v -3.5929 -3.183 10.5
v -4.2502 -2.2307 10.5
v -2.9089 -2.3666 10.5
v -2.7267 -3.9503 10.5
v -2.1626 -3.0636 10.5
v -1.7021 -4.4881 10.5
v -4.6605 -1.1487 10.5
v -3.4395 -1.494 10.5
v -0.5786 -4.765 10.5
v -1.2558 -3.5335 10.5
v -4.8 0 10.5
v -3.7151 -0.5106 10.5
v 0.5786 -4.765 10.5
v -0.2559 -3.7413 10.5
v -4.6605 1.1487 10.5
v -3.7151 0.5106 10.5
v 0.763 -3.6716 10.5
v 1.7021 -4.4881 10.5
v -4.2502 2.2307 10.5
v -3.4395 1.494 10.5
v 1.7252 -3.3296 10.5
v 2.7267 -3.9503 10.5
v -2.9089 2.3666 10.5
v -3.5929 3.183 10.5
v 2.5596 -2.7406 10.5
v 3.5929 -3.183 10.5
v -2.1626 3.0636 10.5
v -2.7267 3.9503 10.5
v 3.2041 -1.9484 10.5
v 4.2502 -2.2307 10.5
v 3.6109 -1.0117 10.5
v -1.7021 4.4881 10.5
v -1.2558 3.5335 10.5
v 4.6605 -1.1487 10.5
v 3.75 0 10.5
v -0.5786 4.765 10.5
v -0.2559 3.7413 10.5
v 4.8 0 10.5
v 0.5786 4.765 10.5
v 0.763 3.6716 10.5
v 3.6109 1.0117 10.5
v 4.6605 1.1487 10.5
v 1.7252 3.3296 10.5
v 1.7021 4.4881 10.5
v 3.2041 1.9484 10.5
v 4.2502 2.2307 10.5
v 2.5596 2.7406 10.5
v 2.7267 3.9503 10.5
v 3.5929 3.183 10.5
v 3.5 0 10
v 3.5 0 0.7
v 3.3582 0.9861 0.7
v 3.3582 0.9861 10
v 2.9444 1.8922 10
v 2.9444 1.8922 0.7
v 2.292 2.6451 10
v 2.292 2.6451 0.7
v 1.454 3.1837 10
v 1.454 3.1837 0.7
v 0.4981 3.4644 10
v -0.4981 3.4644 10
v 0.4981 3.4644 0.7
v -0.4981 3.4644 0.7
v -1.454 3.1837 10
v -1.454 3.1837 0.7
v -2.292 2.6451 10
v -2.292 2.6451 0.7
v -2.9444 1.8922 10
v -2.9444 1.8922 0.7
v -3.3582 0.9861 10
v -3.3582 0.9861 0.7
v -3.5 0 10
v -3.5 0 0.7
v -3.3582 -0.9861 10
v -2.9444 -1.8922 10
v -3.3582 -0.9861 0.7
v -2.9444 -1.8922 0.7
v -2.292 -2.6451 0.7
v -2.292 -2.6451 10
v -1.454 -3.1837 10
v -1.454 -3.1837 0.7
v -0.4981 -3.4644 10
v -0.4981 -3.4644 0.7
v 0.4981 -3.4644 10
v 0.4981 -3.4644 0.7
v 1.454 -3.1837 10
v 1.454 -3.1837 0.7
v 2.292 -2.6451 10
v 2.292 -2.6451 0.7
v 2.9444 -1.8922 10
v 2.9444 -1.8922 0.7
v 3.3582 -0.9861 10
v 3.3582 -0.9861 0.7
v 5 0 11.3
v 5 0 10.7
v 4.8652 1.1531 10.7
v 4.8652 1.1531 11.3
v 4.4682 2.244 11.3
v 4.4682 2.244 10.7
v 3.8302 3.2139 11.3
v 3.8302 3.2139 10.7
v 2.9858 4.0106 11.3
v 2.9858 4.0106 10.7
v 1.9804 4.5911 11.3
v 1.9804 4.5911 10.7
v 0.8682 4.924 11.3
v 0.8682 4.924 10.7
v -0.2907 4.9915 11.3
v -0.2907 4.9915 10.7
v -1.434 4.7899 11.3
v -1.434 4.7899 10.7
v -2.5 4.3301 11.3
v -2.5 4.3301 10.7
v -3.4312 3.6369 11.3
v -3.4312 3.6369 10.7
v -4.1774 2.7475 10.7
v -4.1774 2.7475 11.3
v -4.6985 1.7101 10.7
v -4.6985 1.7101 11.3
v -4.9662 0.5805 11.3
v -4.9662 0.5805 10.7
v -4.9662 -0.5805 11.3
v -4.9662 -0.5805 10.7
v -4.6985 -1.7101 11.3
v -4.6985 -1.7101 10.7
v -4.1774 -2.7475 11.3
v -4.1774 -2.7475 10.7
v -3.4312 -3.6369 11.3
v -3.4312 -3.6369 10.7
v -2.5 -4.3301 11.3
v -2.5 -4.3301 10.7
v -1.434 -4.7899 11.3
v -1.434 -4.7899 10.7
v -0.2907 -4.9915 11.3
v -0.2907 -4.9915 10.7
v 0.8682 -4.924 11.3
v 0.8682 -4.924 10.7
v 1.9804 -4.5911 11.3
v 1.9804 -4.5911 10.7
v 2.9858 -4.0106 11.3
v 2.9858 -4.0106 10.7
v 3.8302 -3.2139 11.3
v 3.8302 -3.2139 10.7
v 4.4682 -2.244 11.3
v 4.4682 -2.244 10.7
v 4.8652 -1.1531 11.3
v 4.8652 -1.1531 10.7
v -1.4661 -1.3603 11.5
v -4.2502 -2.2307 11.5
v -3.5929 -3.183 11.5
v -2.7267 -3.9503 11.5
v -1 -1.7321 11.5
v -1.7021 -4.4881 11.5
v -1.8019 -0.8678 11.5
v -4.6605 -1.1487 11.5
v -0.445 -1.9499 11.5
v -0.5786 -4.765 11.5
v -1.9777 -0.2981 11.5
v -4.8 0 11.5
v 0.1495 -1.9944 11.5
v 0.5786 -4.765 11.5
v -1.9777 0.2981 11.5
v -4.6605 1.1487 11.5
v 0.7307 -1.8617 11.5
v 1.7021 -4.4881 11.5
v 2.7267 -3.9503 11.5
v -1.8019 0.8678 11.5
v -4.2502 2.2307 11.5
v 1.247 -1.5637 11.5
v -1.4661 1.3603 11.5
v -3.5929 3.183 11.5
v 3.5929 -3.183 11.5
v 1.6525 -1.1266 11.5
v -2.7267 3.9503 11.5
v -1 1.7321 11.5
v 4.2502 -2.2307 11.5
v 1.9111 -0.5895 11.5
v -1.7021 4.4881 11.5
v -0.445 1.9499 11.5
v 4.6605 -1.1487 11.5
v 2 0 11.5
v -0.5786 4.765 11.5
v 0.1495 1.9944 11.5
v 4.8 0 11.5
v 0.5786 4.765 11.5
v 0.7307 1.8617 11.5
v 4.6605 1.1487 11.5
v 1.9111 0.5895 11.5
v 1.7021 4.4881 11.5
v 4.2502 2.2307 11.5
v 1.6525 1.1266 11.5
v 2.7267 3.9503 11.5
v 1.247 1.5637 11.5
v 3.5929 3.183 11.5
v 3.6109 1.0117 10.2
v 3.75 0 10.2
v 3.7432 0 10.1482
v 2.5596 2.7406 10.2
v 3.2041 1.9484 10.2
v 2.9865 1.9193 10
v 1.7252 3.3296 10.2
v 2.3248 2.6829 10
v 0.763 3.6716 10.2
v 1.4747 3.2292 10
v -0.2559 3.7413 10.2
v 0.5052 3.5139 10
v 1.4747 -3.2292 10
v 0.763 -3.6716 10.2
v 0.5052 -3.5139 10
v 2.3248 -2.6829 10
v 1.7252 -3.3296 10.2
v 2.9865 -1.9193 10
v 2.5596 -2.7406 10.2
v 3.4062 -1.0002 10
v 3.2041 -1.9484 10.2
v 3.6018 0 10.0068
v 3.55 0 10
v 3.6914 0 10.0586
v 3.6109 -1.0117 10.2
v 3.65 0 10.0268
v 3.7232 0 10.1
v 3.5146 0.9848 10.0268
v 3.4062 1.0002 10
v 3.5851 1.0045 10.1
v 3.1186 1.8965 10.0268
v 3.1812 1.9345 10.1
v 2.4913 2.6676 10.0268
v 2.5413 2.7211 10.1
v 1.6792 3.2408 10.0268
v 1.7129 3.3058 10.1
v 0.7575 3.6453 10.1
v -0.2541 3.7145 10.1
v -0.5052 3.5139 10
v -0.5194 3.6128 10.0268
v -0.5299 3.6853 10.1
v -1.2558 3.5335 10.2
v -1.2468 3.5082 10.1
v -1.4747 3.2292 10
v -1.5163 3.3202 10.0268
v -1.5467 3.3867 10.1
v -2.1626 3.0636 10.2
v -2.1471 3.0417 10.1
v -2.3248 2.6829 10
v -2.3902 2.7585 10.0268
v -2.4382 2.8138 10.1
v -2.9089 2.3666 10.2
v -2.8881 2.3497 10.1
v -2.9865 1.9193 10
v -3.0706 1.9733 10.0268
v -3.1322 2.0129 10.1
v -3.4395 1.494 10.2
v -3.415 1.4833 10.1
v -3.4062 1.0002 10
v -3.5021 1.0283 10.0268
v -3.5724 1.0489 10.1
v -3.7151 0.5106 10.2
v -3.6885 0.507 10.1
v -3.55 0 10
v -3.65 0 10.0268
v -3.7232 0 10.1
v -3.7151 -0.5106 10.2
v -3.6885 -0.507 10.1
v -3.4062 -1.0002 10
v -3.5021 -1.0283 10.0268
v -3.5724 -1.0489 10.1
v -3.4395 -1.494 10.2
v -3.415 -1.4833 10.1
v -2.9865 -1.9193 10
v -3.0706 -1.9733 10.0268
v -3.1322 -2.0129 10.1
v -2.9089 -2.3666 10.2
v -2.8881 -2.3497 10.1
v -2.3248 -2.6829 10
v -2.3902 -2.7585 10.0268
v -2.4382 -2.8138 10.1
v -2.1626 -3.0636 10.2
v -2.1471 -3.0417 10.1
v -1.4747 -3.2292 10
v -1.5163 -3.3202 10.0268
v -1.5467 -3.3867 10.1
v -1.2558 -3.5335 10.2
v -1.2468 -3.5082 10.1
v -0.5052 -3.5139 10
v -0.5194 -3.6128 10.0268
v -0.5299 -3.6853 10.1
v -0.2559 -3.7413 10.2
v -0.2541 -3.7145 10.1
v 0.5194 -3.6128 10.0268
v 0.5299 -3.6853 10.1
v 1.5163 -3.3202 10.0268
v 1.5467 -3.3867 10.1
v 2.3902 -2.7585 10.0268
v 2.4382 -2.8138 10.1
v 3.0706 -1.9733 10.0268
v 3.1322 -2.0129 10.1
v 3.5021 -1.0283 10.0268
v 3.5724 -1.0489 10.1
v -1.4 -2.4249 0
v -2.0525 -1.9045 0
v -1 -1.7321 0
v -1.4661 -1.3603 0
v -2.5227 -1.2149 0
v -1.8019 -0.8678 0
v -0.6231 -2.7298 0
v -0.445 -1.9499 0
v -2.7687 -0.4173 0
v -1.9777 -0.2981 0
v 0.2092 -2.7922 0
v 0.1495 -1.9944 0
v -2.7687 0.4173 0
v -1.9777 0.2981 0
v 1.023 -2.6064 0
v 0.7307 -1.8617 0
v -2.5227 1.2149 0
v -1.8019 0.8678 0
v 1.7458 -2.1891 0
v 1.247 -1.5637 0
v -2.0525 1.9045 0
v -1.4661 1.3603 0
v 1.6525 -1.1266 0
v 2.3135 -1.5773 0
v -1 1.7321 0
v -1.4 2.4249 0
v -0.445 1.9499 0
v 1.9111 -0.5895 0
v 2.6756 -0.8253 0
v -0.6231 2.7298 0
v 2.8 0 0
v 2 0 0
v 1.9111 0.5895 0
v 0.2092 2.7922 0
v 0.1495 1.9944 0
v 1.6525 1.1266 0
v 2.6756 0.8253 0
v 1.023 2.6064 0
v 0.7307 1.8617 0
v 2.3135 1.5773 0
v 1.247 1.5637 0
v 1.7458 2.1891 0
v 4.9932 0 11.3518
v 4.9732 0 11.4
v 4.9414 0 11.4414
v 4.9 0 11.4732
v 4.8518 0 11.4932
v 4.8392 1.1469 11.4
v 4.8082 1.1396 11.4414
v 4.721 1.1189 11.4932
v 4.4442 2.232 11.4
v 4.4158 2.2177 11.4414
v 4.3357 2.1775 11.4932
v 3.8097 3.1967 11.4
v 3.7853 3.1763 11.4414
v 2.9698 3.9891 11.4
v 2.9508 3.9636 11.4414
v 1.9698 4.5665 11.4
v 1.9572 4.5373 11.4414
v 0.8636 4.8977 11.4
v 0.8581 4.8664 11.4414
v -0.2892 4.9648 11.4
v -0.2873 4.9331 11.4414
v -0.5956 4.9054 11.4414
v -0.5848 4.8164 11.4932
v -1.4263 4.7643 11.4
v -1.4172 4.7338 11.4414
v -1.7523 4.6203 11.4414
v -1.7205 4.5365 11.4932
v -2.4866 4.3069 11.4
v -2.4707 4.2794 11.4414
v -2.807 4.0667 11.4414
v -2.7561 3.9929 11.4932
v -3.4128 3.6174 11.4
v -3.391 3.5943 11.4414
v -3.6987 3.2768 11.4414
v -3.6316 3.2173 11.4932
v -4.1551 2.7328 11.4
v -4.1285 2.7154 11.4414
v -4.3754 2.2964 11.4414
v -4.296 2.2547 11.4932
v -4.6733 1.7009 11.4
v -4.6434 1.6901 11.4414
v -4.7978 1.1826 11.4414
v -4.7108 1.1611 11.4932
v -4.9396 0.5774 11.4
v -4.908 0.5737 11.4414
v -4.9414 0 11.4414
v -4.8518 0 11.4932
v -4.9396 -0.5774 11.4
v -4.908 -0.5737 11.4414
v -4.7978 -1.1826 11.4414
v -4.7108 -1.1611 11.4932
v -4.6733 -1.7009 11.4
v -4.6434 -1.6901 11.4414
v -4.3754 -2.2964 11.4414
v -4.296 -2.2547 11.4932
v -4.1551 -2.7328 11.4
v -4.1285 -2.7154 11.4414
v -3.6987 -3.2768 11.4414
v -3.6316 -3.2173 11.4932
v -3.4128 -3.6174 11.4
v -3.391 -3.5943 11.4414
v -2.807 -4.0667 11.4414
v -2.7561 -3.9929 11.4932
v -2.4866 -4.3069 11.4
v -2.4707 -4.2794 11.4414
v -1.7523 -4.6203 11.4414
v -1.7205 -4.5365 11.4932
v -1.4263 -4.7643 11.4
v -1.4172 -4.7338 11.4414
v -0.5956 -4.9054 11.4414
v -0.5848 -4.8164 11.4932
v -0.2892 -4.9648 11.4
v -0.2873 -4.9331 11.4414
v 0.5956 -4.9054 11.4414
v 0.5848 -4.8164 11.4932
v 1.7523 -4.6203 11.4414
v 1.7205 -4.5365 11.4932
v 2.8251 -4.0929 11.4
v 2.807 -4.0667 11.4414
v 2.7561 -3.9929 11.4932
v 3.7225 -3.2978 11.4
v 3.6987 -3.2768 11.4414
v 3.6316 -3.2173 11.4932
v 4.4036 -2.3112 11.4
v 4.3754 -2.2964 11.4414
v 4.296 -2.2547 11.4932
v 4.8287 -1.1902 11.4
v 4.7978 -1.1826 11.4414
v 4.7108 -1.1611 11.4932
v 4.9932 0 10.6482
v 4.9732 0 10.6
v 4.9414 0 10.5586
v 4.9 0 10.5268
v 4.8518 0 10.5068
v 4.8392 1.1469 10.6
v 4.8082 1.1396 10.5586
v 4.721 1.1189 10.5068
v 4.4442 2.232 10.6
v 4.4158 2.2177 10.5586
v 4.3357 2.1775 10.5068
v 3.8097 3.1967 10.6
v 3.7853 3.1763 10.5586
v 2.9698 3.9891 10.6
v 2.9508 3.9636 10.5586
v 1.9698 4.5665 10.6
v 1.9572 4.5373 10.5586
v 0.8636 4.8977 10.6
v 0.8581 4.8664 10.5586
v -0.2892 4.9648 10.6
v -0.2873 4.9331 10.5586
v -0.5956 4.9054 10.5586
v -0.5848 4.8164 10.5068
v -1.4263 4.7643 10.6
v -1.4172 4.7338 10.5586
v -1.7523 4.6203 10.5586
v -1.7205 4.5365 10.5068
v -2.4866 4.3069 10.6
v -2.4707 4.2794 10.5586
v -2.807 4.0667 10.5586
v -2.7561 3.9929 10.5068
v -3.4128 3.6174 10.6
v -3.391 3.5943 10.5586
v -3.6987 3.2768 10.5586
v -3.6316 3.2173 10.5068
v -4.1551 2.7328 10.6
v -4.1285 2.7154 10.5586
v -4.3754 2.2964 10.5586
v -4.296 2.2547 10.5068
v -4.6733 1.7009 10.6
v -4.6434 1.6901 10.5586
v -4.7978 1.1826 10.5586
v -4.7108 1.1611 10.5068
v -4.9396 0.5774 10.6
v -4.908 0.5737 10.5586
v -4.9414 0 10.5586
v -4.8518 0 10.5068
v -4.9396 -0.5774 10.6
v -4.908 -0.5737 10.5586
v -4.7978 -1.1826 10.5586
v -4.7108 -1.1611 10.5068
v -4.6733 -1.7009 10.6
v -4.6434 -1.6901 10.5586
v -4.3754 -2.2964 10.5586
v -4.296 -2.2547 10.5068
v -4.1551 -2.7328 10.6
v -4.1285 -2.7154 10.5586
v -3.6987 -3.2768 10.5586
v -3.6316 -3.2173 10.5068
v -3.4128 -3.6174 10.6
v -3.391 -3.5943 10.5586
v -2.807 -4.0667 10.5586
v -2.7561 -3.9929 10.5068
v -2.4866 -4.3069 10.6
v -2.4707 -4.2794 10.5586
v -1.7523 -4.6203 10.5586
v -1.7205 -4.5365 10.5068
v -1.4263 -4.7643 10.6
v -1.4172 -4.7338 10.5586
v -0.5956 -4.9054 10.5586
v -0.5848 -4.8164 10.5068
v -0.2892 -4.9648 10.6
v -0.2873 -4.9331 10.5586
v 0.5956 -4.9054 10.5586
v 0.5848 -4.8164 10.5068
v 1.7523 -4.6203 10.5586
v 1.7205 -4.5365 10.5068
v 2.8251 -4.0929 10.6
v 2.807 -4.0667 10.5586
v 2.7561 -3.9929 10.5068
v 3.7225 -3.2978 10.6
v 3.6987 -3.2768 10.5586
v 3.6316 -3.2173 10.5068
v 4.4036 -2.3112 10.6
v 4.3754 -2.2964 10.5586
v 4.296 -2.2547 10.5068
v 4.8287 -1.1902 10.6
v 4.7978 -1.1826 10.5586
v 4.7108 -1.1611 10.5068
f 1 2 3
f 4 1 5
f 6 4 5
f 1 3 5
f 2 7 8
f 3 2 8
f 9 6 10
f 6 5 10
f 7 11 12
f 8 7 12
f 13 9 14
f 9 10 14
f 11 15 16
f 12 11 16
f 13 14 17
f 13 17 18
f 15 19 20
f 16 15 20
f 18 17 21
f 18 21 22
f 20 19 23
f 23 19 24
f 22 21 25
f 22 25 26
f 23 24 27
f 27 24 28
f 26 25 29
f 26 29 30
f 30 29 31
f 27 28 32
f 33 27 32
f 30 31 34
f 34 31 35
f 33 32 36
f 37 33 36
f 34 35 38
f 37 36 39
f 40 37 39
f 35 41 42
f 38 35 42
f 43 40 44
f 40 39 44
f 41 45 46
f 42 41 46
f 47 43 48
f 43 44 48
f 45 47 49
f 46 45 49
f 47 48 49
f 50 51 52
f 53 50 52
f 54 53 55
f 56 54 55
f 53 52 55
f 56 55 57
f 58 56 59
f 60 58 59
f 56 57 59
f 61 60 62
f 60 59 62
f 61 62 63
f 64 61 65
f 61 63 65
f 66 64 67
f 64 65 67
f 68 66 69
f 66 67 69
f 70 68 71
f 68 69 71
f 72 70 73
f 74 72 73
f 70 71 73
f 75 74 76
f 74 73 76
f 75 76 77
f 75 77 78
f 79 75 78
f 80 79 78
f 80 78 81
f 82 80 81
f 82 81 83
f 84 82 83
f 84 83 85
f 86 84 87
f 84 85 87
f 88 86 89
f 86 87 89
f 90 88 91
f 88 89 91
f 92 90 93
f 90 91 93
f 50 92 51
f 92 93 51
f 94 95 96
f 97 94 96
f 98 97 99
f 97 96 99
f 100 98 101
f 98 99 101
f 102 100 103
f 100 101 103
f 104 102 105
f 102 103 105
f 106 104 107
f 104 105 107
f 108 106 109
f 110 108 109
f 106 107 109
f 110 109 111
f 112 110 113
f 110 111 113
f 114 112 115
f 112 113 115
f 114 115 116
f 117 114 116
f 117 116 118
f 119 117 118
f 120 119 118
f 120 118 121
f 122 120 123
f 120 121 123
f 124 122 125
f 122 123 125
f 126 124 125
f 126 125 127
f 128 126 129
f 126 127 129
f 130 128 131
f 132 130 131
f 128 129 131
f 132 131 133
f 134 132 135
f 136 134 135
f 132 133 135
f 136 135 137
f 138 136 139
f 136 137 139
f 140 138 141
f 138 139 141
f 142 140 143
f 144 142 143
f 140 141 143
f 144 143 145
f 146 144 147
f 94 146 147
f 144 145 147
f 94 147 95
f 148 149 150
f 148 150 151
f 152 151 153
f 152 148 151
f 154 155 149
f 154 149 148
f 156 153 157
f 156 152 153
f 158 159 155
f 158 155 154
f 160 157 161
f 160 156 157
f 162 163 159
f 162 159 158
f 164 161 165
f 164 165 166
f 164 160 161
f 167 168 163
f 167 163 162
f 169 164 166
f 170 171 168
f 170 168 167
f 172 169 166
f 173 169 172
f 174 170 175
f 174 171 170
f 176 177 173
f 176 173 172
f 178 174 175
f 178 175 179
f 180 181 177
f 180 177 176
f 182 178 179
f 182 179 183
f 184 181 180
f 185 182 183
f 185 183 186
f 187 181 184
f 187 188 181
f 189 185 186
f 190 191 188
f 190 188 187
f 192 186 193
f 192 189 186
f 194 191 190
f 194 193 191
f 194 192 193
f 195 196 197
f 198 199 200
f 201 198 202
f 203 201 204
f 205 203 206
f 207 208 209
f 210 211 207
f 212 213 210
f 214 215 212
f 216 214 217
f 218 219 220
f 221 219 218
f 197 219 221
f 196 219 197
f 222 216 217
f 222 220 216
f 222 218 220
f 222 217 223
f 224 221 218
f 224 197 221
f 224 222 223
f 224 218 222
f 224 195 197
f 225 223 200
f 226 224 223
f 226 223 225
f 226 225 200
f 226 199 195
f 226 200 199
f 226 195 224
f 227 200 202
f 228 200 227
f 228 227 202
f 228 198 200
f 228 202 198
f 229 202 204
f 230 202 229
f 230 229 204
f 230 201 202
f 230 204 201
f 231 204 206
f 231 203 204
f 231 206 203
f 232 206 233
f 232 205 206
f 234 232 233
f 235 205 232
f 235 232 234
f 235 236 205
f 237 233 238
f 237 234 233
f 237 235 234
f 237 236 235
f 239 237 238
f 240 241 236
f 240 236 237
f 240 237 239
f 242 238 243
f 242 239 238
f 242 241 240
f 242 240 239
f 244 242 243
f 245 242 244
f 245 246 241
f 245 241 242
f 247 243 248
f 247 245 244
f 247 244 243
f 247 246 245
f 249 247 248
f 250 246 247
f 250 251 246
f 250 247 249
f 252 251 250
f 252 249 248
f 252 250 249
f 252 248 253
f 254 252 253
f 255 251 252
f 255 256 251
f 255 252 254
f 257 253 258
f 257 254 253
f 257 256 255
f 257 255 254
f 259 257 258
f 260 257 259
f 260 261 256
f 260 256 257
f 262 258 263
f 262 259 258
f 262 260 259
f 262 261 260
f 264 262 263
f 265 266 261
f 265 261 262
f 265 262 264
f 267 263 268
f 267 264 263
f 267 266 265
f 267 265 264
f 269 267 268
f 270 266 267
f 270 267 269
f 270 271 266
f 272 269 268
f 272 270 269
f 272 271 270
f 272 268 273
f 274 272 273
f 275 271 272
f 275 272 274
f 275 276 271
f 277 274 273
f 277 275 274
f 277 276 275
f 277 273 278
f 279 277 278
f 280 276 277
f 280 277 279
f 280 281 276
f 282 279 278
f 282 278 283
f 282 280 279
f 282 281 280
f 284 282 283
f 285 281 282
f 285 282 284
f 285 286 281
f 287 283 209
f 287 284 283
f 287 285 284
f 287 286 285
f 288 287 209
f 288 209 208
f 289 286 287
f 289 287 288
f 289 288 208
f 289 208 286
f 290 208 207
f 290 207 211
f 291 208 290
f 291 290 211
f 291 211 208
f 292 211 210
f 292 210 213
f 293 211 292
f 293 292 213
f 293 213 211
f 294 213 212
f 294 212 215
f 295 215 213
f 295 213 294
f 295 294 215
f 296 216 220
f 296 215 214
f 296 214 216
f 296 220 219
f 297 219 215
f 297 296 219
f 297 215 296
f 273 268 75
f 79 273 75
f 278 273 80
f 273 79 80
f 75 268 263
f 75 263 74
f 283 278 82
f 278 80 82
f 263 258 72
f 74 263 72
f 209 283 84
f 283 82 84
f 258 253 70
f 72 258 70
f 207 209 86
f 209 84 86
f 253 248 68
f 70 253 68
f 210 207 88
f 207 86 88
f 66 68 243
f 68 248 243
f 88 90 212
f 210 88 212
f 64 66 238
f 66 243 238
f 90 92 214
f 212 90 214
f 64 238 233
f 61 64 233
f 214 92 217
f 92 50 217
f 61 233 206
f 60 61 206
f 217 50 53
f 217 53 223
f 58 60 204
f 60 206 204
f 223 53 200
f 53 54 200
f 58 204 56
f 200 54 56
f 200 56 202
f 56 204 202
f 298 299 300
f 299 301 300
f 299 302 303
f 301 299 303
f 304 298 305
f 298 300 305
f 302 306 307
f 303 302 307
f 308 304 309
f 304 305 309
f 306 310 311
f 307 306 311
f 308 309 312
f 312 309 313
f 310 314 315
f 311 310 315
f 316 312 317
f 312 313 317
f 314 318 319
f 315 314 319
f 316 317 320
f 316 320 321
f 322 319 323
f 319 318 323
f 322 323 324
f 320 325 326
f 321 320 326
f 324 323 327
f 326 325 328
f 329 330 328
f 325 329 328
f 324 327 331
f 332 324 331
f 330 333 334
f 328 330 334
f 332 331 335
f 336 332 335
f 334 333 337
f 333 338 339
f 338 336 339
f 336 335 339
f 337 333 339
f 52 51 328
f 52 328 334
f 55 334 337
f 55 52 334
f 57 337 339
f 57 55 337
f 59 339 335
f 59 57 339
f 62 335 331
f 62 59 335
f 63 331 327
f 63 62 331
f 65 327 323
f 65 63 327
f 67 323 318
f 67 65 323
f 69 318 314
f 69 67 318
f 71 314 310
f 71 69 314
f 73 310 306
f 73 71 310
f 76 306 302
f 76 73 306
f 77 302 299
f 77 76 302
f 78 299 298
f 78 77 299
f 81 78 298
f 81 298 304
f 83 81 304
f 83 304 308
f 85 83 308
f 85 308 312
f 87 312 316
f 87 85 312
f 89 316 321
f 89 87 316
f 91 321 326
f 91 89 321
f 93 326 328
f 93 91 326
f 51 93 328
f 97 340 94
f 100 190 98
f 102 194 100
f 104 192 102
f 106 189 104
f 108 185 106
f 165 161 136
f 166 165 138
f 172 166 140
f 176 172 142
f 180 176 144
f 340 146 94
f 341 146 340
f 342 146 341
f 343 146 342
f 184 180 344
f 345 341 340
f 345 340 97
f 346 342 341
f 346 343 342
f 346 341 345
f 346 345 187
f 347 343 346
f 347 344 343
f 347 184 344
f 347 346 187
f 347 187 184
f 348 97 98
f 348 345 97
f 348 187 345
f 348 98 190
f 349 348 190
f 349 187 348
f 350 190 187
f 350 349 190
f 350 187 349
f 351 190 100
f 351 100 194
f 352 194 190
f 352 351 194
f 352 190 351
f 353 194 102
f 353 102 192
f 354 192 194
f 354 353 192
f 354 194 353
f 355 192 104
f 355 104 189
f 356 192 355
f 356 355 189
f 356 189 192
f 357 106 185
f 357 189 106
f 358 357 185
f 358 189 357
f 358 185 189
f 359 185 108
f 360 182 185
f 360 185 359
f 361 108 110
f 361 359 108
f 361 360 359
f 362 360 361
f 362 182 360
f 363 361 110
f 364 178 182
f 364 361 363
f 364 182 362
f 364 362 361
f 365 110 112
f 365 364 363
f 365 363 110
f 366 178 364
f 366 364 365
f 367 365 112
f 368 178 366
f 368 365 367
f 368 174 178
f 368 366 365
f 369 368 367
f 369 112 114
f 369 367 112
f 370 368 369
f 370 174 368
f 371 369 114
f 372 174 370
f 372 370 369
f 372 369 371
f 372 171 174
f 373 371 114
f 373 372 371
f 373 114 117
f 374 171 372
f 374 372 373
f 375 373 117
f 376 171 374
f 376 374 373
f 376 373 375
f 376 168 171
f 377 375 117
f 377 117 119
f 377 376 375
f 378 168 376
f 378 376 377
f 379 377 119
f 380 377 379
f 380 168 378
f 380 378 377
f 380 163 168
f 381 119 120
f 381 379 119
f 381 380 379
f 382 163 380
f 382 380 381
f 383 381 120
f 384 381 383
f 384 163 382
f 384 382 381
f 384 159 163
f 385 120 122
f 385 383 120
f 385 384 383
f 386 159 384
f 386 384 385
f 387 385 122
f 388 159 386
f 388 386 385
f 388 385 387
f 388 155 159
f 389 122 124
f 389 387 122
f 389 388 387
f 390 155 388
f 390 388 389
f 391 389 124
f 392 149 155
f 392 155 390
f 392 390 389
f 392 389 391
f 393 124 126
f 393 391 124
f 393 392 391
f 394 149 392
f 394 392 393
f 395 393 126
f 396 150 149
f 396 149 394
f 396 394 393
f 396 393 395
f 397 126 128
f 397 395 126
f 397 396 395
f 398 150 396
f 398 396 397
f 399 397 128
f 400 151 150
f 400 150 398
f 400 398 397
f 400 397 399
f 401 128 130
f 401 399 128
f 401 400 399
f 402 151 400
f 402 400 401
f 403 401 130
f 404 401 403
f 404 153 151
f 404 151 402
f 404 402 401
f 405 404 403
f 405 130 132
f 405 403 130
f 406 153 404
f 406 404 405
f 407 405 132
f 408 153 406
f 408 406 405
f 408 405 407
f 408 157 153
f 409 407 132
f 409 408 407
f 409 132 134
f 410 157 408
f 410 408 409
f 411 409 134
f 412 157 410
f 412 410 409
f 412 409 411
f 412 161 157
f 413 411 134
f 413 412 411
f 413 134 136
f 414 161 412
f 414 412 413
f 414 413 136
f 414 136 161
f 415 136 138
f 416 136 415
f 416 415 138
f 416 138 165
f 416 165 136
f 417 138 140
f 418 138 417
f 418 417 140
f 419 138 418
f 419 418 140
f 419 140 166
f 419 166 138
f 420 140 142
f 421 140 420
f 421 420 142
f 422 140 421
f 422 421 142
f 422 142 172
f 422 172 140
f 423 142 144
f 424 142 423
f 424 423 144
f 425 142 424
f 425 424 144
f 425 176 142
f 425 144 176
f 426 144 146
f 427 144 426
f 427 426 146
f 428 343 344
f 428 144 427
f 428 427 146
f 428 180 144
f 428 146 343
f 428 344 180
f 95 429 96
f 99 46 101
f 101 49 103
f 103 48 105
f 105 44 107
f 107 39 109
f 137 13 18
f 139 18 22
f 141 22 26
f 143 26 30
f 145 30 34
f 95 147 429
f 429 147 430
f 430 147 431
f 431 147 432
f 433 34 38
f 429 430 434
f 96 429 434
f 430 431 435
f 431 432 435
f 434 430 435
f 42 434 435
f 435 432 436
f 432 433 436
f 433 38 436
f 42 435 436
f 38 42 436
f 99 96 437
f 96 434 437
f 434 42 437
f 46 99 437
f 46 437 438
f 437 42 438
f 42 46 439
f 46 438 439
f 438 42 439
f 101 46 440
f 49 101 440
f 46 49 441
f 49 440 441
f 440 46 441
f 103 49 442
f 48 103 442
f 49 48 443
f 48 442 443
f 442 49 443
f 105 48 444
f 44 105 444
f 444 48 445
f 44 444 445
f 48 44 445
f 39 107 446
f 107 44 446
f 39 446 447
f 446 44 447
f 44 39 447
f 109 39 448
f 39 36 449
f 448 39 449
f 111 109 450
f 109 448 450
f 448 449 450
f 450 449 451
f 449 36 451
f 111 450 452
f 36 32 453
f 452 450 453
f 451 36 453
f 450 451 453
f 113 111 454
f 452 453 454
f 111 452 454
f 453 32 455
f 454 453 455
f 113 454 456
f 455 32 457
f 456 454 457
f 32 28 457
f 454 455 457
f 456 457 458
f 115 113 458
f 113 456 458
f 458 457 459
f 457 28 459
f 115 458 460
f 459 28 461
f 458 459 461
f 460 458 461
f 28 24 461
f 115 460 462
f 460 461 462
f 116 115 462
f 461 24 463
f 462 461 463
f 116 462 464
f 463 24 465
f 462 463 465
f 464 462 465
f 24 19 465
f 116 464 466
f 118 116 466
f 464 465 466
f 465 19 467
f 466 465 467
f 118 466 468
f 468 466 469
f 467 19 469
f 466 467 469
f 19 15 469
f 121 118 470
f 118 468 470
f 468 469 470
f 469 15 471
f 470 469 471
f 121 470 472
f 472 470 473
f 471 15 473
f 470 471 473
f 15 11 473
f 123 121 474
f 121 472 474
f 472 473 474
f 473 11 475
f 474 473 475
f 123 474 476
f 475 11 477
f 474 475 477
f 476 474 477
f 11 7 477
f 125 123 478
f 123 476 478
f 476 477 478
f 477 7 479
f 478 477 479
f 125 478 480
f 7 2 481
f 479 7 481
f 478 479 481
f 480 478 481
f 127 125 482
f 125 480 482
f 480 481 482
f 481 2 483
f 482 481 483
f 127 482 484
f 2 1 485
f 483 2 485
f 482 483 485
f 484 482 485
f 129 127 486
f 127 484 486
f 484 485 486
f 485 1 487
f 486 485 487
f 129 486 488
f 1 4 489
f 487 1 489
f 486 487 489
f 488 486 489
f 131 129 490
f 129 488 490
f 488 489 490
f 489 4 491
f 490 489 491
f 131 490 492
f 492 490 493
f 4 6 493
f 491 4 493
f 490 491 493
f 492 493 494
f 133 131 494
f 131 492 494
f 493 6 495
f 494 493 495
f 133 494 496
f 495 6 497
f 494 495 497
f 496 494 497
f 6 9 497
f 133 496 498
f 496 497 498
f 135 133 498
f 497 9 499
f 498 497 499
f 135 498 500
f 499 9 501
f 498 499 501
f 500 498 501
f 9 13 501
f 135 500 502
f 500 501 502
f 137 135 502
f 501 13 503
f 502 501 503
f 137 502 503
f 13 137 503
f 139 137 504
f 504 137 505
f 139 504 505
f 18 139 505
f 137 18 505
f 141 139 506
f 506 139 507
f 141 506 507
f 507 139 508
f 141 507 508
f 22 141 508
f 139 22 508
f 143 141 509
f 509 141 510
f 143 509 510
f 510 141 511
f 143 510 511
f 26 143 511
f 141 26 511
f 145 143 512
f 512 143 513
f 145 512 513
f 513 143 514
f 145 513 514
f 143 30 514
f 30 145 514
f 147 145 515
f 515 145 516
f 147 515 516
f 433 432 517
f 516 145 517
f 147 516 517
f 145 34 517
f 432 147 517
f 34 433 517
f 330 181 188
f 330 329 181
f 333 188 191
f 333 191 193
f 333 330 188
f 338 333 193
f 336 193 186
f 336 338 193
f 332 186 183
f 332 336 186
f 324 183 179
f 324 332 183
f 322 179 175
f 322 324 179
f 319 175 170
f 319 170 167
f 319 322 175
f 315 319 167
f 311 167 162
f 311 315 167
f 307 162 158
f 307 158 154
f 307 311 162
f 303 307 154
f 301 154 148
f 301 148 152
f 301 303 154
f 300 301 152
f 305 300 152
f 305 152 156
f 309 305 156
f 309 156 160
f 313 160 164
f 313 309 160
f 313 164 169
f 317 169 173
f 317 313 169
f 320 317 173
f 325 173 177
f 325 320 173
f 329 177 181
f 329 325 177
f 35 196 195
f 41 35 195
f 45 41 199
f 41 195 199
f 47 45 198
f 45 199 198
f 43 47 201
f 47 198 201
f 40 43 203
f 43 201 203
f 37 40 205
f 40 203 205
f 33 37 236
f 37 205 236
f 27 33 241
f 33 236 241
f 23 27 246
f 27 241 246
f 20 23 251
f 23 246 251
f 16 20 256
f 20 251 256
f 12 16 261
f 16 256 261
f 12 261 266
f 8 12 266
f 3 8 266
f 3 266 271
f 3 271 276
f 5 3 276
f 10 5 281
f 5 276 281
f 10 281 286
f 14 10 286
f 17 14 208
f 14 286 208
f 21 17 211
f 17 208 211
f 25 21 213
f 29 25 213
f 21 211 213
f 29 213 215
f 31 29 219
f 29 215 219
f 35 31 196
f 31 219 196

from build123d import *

# Parameters (mm, degrees)
F0_R     = 3.5
F0_R_2   = 2
F1_DEPTH = 10
F2_R     = 3.75
F2_R_2   = 2
F3_DEPTH = 0.5
F4_R     = 5
F4_R_2   = 2
F5_DEPTH = 1
F6_R     = 0.2
F7_SIZE  = 0.7


with BuildPart() as f1:
    # F0 (on Top) → F1 (new body)
    with BuildSketch(Plane.XY):
        Circle(F0_R)
        Circle(F0_R_2, mode=Mode.SUBTRACT)
    extrude(amount=F1_DEPTH)

    # F2 (on face) → F3 (join)
    with BuildSketch(Plane.XY.offset(10)):
        Circle(F2_R)
        Circle(F2_R_2, mode=Mode.SUBTRACT)
    extrude(amount=F3_DEPTH)

    # F4 (on face) → F5 (join)
    with BuildSketch(Plane.XY.offset(10.5)):
        Circle(F4_R)
        Circle(F4_R_2, mode=Mode.SUBTRACT)
    extrude(amount=F5_DEPTH)

    # F6
    f6_edges = [f1.edges().sort_by_distance(p)[0] for p in [
        (-5, 0, 10.5),
        (-5, 0, 11.5),
        (-3.75, 0, 10),
    ]]
    fillet(f6_edges, radius=F6_R)

    # F7
    f7_edges = [f1.edges().sort_by_distance(p)[0] for p in [
        (-3.5, 0, 0),
    ]]
    chamfer(f7_edges, length=F7_SIZE)


solid = f1.part
